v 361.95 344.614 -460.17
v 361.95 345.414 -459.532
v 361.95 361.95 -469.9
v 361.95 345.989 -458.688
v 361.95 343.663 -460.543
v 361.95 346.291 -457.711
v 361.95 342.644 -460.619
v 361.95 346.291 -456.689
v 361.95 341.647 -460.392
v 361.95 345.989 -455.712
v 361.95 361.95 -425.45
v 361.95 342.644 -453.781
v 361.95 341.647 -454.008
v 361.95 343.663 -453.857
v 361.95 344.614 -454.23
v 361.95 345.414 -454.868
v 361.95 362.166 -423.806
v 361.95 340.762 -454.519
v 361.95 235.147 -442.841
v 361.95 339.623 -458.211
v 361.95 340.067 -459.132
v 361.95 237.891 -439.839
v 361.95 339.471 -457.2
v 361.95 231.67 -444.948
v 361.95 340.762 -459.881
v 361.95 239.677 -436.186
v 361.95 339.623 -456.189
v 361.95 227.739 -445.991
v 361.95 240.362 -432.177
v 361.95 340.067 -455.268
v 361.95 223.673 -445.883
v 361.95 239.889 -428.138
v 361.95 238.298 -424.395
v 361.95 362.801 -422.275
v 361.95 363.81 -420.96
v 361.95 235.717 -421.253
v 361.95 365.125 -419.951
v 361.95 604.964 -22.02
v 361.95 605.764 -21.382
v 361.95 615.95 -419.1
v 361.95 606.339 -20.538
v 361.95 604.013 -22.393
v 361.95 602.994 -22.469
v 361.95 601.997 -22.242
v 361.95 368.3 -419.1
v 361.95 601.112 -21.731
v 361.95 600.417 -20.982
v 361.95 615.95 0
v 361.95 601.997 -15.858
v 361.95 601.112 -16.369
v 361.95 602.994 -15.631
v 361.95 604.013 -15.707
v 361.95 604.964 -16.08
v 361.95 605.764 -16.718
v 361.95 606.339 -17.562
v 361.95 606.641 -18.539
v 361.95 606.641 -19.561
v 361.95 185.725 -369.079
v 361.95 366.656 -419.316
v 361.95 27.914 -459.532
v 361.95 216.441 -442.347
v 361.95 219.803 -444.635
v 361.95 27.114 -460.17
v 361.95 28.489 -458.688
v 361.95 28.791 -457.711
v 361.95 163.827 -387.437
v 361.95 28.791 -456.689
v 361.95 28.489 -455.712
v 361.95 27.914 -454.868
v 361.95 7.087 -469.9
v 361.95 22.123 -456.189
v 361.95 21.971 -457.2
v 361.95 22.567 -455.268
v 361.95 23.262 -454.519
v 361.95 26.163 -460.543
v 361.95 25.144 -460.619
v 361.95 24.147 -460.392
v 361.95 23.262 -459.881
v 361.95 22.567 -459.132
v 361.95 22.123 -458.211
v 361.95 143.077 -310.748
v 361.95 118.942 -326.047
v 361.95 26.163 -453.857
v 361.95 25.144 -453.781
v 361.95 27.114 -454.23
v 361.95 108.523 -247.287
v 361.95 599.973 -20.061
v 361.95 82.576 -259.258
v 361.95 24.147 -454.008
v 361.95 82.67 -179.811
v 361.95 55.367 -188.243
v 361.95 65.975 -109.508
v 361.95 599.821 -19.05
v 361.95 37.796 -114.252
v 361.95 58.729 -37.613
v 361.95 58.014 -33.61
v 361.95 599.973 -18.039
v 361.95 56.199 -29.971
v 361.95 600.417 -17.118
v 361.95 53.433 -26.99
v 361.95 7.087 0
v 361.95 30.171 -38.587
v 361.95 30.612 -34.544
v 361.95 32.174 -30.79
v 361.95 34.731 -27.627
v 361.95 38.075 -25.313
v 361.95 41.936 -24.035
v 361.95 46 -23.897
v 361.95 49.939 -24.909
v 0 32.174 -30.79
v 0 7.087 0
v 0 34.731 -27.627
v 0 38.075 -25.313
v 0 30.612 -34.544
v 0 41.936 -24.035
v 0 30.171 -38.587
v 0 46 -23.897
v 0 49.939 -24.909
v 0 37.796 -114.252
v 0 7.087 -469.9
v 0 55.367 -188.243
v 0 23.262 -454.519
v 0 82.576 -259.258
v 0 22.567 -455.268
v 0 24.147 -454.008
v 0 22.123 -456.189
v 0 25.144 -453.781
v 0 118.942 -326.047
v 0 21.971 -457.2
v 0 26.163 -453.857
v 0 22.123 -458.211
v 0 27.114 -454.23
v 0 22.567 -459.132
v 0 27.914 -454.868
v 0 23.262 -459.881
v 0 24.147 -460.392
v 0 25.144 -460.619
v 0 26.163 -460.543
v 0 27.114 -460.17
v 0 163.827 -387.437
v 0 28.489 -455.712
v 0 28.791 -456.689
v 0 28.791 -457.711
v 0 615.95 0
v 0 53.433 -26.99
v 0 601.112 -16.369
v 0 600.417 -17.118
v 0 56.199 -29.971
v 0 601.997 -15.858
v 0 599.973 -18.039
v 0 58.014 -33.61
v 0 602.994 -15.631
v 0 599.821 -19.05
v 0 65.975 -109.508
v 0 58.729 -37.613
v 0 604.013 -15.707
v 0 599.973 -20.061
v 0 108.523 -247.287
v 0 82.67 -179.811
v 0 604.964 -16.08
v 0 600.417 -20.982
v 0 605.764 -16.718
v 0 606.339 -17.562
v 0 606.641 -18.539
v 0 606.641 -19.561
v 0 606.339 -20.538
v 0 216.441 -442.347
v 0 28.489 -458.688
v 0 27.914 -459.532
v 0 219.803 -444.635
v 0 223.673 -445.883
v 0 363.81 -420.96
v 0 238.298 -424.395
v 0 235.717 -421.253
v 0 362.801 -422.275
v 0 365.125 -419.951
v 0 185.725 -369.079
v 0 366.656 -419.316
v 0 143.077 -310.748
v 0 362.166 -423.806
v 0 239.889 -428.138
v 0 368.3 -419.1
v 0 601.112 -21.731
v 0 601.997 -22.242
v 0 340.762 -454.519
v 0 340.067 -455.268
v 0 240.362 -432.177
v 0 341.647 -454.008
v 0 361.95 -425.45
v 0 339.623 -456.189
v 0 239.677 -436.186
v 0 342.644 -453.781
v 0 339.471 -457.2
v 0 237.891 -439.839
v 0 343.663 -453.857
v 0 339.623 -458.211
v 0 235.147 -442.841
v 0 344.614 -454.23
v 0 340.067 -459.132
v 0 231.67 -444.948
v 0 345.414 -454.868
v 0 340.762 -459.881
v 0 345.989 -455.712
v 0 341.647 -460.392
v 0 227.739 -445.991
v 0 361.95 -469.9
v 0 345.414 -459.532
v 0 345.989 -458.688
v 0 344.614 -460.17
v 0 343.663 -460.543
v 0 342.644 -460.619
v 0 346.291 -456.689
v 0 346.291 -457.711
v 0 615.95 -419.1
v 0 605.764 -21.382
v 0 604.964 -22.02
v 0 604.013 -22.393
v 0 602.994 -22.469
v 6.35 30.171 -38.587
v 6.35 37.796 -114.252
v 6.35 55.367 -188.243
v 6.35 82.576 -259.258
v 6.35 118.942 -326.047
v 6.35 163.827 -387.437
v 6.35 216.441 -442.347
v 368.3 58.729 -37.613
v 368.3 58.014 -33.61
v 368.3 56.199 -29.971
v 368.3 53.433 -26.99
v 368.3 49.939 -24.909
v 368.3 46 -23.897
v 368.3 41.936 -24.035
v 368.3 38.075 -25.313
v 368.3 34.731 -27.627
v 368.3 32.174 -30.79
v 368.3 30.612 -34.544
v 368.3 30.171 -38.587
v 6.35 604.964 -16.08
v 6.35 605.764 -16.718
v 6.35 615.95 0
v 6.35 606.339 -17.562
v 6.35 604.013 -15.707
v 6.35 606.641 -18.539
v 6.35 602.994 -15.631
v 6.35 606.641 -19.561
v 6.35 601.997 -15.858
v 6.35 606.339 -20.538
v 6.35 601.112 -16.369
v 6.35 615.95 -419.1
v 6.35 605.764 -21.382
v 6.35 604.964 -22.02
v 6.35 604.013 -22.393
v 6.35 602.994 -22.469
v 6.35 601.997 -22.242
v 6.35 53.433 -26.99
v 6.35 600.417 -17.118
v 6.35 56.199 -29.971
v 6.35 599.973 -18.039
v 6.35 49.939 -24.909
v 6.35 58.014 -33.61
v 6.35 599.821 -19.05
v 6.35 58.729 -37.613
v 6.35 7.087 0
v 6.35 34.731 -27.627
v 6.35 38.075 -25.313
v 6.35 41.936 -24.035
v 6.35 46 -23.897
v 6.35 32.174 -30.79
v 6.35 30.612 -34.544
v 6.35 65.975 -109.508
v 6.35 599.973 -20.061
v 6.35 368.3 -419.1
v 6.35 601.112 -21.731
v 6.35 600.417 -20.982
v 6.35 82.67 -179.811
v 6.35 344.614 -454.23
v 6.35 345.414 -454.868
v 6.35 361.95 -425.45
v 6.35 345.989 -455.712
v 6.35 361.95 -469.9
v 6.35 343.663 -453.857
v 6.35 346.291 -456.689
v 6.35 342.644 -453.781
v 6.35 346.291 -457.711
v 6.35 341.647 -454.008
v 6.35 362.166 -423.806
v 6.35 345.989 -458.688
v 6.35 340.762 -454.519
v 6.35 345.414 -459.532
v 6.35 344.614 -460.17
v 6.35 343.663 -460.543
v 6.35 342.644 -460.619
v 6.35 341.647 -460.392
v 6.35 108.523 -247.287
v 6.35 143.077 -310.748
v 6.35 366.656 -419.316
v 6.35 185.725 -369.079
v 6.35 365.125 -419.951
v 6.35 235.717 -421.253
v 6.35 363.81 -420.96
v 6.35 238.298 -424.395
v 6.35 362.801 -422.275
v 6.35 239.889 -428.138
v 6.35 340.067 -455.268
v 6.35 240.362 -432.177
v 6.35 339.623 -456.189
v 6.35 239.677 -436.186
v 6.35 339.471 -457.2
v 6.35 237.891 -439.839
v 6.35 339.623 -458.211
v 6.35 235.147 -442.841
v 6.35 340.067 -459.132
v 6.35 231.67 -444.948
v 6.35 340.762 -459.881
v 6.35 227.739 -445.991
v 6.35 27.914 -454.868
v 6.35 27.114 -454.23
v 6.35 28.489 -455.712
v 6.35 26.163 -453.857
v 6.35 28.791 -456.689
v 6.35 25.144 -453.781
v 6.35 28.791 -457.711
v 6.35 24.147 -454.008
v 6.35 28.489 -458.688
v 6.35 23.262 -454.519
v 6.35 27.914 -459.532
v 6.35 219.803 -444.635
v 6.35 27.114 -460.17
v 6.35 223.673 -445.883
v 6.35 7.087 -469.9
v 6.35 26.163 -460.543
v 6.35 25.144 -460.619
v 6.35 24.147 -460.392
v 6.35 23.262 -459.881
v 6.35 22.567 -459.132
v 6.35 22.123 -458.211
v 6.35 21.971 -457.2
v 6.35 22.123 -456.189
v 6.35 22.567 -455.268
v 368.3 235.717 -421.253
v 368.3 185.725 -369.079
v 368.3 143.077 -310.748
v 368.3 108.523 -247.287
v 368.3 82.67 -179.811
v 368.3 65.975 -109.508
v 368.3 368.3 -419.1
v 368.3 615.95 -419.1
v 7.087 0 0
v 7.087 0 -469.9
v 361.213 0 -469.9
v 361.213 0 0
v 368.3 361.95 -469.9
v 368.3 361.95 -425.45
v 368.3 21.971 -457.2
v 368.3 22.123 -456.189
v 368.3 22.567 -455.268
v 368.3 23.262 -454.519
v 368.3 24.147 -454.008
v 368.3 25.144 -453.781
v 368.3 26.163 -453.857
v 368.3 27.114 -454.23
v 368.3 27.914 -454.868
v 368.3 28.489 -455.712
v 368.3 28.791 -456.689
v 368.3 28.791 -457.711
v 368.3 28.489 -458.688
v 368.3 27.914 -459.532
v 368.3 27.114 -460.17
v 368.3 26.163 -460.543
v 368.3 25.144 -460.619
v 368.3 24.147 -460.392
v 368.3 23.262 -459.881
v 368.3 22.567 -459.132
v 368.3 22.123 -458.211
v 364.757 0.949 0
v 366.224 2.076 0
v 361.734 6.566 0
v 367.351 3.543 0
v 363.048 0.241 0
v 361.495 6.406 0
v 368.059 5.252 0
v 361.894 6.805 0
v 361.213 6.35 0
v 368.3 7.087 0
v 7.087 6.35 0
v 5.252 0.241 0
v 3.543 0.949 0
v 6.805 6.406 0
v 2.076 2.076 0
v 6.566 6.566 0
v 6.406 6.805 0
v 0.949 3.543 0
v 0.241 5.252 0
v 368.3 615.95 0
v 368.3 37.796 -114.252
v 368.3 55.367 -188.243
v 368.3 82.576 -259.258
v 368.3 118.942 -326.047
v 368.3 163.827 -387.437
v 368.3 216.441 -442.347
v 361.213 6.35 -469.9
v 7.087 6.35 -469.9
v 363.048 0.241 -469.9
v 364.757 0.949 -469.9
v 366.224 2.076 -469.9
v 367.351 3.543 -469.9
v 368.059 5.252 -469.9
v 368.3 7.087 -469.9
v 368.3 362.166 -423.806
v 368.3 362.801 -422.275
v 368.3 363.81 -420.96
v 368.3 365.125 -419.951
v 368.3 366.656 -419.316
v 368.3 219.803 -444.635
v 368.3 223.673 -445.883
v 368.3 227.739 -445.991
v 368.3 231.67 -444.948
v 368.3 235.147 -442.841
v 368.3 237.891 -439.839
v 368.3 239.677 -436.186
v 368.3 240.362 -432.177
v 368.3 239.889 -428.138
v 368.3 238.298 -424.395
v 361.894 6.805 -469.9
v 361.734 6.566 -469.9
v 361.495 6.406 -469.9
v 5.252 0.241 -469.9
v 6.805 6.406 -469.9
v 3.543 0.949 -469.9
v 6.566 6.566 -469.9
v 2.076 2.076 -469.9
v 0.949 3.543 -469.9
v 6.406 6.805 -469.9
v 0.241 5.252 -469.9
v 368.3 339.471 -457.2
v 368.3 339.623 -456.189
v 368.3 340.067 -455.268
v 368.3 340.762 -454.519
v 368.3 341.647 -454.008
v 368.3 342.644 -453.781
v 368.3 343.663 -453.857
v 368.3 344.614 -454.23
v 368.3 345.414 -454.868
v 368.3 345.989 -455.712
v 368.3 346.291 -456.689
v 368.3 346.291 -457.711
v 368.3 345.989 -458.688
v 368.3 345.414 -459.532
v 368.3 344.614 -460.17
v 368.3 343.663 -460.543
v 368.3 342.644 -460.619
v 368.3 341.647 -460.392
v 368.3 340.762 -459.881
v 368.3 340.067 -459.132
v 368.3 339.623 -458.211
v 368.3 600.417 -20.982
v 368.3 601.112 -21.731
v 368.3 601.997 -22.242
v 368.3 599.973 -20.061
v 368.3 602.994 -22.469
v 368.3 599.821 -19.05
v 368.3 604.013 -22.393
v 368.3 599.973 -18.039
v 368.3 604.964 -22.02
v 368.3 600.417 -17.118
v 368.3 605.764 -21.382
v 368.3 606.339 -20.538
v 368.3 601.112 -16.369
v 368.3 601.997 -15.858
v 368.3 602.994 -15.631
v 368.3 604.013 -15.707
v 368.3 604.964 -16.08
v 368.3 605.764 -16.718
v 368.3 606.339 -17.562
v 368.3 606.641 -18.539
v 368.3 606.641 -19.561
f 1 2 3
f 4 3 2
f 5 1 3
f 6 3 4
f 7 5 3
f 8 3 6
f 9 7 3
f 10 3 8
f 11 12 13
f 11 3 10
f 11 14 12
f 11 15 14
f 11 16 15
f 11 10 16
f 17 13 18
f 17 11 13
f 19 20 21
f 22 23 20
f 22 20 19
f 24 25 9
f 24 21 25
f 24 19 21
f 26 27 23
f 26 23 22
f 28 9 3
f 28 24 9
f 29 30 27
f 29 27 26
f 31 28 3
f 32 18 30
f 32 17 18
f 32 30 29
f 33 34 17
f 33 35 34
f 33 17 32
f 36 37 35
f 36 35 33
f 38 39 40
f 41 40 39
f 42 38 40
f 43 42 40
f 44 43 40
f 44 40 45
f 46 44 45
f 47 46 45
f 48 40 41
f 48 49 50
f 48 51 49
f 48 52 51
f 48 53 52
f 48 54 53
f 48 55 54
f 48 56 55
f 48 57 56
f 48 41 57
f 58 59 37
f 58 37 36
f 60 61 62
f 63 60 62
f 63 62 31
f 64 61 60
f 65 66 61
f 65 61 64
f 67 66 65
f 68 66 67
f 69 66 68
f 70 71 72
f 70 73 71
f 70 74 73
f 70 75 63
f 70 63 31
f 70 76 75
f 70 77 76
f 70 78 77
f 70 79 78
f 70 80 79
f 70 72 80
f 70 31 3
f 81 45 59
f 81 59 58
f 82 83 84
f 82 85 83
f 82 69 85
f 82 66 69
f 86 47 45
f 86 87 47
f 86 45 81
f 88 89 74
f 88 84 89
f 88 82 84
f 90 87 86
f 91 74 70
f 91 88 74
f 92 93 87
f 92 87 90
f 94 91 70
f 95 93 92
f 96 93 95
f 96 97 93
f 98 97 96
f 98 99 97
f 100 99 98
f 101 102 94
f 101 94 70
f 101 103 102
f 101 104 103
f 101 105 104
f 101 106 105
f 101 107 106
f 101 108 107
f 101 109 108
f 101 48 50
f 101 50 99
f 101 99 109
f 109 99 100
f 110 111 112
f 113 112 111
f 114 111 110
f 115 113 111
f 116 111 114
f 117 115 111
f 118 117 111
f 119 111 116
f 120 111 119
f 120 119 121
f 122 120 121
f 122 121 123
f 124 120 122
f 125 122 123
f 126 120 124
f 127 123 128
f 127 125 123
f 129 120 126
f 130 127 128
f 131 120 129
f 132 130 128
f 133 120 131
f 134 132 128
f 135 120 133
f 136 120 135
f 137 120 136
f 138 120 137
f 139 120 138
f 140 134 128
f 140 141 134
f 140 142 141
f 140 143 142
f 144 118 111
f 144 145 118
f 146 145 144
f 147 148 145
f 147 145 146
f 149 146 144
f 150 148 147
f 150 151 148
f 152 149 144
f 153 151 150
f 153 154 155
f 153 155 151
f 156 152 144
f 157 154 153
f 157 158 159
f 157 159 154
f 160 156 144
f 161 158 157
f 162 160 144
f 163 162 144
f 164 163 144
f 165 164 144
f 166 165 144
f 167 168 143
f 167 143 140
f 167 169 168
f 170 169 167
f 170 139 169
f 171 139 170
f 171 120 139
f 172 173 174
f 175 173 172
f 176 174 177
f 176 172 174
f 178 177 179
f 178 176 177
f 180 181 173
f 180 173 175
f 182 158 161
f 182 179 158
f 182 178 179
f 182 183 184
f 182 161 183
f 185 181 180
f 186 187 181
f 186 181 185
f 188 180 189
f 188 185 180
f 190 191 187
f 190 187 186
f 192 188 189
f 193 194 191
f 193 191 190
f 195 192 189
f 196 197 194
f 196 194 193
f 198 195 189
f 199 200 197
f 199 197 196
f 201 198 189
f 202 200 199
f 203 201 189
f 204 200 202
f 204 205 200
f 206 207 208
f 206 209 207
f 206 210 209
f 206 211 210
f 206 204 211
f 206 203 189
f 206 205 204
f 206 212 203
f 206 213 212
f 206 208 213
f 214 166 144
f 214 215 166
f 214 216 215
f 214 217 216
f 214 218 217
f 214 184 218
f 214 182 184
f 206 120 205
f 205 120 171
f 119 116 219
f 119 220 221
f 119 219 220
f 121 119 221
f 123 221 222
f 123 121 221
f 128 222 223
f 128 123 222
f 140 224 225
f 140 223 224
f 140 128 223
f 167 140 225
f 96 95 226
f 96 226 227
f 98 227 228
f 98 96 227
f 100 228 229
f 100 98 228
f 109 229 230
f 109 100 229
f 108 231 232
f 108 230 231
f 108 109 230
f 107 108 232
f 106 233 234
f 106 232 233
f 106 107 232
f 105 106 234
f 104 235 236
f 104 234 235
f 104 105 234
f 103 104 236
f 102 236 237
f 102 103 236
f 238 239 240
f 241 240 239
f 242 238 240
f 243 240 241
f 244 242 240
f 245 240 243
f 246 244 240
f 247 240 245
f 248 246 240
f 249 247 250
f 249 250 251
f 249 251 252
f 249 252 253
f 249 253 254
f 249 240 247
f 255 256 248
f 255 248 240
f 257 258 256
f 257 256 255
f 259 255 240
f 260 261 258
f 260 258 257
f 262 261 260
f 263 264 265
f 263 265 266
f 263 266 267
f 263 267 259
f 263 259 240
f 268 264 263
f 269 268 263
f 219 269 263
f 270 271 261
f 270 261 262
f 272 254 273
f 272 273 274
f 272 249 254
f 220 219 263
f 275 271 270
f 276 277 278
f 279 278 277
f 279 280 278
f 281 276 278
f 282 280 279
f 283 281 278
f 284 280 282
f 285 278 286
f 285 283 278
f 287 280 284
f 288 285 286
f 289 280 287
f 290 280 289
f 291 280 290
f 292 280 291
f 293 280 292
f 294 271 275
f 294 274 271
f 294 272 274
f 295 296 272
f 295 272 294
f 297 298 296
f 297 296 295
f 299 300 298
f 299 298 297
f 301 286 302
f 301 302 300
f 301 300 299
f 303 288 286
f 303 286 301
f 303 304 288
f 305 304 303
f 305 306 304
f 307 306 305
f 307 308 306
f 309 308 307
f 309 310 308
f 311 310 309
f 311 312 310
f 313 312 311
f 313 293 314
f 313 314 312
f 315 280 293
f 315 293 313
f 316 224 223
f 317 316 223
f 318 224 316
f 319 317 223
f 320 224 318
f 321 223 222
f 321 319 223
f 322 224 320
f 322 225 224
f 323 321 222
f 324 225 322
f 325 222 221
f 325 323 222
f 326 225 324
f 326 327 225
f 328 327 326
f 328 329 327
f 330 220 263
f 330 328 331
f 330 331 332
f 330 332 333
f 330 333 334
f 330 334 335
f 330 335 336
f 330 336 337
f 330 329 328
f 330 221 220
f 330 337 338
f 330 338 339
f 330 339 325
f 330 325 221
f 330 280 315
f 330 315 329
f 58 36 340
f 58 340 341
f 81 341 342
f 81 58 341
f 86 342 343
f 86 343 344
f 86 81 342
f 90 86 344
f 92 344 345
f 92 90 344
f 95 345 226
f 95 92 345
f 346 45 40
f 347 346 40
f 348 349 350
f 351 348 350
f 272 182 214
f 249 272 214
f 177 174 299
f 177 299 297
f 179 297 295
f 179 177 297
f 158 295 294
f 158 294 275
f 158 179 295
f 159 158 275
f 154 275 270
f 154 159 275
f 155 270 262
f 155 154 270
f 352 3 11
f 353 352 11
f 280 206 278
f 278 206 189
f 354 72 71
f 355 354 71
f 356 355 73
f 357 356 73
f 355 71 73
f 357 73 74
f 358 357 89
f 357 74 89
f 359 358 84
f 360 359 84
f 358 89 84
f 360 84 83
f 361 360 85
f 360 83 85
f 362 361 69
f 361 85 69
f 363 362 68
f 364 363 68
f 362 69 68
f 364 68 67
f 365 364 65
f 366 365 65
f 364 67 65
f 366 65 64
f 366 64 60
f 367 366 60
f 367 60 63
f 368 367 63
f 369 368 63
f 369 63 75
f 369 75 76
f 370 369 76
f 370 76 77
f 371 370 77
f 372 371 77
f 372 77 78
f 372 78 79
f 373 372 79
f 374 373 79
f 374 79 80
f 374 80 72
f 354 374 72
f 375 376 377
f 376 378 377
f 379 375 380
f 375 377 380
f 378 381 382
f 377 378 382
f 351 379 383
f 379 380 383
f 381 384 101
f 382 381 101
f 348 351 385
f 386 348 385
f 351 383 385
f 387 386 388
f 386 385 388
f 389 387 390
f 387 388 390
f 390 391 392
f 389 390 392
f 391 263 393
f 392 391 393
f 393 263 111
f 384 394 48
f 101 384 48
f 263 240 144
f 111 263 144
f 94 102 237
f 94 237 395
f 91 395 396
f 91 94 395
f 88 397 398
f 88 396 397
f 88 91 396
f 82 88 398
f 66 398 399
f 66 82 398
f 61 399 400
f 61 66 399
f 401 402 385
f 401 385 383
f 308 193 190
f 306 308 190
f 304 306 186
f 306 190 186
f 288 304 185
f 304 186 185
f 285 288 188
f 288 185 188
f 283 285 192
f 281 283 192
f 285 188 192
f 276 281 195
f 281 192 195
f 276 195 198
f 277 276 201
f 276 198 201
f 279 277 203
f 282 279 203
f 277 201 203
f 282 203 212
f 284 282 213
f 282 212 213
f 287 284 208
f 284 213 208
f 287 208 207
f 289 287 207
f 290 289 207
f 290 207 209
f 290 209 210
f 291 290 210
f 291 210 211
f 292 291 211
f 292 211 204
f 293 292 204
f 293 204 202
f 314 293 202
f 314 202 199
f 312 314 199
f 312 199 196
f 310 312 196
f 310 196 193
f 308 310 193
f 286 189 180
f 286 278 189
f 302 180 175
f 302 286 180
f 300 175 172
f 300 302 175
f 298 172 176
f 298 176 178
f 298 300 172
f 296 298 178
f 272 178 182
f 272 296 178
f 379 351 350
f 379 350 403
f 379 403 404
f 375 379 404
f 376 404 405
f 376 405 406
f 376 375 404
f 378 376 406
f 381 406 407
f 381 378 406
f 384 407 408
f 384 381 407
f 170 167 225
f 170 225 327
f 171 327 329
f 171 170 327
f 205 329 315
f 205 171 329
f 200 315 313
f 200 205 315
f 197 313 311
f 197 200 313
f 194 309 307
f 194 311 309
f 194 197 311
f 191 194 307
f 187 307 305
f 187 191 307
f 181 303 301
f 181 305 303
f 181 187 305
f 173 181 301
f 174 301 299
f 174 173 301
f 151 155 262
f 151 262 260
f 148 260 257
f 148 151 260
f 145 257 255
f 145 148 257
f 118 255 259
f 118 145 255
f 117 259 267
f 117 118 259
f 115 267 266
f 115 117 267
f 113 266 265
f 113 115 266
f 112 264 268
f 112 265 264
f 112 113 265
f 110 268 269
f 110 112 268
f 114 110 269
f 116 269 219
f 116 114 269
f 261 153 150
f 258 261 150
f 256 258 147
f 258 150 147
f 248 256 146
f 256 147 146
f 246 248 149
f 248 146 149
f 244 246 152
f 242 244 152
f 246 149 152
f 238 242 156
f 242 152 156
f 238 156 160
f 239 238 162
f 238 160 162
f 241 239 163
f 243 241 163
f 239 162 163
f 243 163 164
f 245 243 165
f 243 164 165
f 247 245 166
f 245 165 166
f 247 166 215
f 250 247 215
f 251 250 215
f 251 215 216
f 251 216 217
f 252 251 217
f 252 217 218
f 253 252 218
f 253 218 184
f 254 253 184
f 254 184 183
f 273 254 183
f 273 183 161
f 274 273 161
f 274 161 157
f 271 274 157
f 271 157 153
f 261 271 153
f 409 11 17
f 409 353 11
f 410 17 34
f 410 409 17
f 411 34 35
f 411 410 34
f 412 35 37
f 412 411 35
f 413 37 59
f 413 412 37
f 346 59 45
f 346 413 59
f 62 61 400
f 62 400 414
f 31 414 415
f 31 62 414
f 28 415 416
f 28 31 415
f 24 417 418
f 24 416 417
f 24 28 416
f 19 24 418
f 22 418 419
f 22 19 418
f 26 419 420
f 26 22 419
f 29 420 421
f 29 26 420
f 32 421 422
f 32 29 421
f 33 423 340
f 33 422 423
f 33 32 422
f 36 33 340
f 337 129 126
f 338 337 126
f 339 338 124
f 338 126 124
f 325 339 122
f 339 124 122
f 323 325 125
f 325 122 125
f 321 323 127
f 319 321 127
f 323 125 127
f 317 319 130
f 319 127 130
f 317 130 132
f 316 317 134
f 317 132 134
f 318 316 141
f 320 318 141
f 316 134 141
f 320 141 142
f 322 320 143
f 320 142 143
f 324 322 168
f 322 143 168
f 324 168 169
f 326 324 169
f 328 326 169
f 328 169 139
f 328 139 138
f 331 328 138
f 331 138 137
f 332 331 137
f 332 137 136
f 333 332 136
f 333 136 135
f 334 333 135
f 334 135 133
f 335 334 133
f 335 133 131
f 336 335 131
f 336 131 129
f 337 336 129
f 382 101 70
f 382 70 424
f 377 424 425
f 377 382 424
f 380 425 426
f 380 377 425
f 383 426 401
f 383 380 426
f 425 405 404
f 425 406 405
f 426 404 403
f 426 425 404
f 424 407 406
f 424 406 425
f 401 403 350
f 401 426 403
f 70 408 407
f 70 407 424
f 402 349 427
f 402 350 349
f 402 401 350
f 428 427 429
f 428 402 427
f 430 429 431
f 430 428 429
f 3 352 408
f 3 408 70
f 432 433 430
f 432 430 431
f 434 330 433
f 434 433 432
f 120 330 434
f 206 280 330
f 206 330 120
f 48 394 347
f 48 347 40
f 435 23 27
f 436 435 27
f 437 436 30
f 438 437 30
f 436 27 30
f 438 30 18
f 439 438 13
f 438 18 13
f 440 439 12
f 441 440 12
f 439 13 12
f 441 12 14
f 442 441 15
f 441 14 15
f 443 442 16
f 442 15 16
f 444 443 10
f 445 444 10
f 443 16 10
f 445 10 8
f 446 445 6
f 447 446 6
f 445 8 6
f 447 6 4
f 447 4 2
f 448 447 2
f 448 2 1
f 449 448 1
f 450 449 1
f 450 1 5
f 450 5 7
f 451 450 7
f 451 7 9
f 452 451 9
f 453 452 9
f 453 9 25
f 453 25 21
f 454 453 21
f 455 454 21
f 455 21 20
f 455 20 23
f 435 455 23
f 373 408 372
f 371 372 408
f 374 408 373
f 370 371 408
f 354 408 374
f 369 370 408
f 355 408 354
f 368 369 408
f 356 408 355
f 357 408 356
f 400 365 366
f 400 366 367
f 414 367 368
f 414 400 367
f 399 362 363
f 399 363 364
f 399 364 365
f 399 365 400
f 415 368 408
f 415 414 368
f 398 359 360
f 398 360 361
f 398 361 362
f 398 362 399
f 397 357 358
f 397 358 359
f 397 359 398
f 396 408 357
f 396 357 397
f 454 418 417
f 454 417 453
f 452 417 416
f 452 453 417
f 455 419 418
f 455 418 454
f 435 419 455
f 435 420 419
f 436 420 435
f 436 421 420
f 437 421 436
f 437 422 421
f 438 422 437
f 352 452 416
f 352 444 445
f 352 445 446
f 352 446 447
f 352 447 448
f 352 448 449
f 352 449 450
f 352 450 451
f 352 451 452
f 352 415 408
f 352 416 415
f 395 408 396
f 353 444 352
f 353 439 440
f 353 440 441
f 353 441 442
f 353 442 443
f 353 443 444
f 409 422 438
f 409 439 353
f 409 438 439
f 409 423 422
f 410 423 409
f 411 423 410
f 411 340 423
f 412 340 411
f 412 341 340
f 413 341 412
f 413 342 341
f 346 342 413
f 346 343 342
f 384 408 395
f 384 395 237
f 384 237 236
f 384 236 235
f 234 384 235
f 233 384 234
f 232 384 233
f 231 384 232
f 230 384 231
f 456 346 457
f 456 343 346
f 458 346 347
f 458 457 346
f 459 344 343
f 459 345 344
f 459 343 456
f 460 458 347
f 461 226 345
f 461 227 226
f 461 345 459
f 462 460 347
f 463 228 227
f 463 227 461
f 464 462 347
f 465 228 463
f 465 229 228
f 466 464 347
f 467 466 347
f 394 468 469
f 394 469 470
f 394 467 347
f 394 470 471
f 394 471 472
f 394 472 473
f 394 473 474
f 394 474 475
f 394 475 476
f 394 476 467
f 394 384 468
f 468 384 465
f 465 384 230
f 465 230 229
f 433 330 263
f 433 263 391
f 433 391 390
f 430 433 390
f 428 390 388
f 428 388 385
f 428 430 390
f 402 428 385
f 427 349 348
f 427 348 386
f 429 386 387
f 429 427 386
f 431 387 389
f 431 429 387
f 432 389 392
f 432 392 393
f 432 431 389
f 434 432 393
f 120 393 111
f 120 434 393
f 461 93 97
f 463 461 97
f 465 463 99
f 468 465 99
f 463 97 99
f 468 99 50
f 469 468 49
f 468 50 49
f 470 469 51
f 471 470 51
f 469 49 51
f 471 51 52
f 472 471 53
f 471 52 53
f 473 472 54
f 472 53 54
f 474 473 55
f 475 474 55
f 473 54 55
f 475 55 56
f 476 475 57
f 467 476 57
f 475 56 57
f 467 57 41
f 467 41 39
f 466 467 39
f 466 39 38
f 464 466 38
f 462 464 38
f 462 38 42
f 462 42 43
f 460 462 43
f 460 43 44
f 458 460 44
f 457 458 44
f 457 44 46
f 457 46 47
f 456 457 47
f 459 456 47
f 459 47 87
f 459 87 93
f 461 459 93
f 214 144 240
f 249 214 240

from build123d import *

# Parameters (mm, degrees)
SKETCH1_W                    = 368.3
SKETCH1_H                    = 469.9
BASE_FLANGE1_DEPTH           = 6.35
EDGE_FLANGE1_STRIP_W         = 26.8732
EDGE_FLANGE1_STRIP_H         = 6.35
EDGE_FLANGE1_STRIP_CUT_DEPTH = 469.9
EDGE_FLANGE1_DEPTH           = 469.9
EDGE_FLANGE2_STRIP_W         = 26.8732
EDGE_FLANGE2_STRIP_H         = 6.35
EDGE_FLANGE2_STRIP_CUT_DEPTH = 469.9
EDGE_FLANGE2_DEPTH           = 469.9
SKETCH14_R                   = 3.429
SKETCH14_W                   = 50.8
SKETCH14_H                   = 254
CUT_EXTRUDE1_DEPTH           = 858.814258741
FILLET1_R                    = 6.35
CUT_EXTRUDE2_DEPTH           = 858.814258741


# Sheet-metal steps are written as plain solids
with BuildPart() as part:
    # Sketch1 → Base-Flange1 (new body)
    with BuildSketch(Plane(origin=(0, 0, 0), x_dir=(1, 0, 0), z_dir=(0, 1, 0))):
        with Locations((184.15, 234.95)):
            Rectangle(SKETCH1_W, SKETCH1_H)
    extrude(amount=BASE_FLANGE1_DEPTH)

    # Edge-Flange1 strip (across the edge) → Edge-Flange1 strip cut (cut)
    with BuildSketch(Plane(origin=(368.3, 6.35, 0), x_dir=(-1, 0, 0), z_dir=(0, 0, -1))):
        with Locations((-6.35, -3.175)):
            Rectangle(EDGE_FLANGE1_STRIP_W, EDGE_FLANGE1_STRIP_H)
    extrude(amount=EDGE_FLANGE1_STRIP_CUT_DEPTH, mode=Mode.SUBTRACT)

    # Edge-Flange1 section (across the edge) → Edge-Flange1 (add)
    with BuildSketch(Plane(origin=(368.3, 6.35, 0), x_dir=(-1, 0, 0), z_dir=(0, 0, -1))):
        with BuildLine():
            Line((0, 0.7366), (0, 609.6))
            Line((0, 609.6), (6.35, 609.6))
            Line((6.35, 609.6), (6.35, 0.7366))
            ThreePointArc((6.35, 0.7366), (6.565745145, 0.215745145), (7.0866, 0))
            Line((7.0866, 0), (7.0866, -6.35))
            ThreePointArc((7.0866, -6.35), (2.075617084, -4.274382916), (0, 0.7366))
        make_face()
    extrude(amount=EDGE_FLANGE1_DEPTH)

    # Edge-Flange2 strip (across the edge) → Edge-Flange2 strip cut (cut)
    with BuildSketch(Plane(origin=(0, 6.35, -469.9), x_dir=(1, 0, 0), z_dir=(0, 0, 1))):
        with Locations((-6.35, -3.175)):
            Rectangle(EDGE_FLANGE2_STRIP_W, EDGE_FLANGE2_STRIP_H)
    extrude(amount=EDGE_FLANGE2_STRIP_CUT_DEPTH, mode=Mode.SUBTRACT)

    # Edge-Flange2 section (across the edge) → Edge-Flange2 (add)
    with BuildSketch(Plane(origin=(0, 6.35, -469.9), x_dir=(1, 0, 0), z_dir=(0, 0, 1))):
        with BuildLine():
            Line((0, 0.7366), (0, 609.6))
            Line((0, 609.6), (6.35, 609.6))
            Line((6.35, 609.6), (6.35, 0.7366))
            ThreePointArc((6.35, 0.7366), (6.565745145, 0.215745145), (7.0866, 0))
            Line((7.0866, 0), (7.0866, -6.35))
            ThreePointArc((7.0866, -6.35), (2.075617084, -4.274382916), (0, 0.7366))
        make_face()
    extrude(amount=EDGE_FLANGE2_DEPTH)

    # Sketch14 → Cut-Extrude1 (cut, through all)
    with BuildSketch(Plane.ZY):
        with Locations(Location((-19.05, 603.25, 0), (0, 0, 270))):
            Circle(SKETCH14_R)
        with Locations(Location((-457.2, 342.9, 0), (0, 0, 270))):
            Circle(SKETCH14_R)
        with Locations(Location((-457.2, 25.4, 0), (0, 0, 270))):
            Circle(SKETCH14_R)
        with Locations((-444.5, 488.95)):
            Rectangle(SKETCH14_W, SKETCH14_H)
    extrude(amount=-CUT_EXTRUDE1_DEPTH, mode=Mode.SUBTRACT)

    # Fillet1
    fillet1_edges = [part.edges().sort_by_distance(p)[0] for p in [
        (365.125, 361.95, -419.1),
        (3.175, 361.95, -419.1),
    ]]
    fillet(fillet1_edges, radius=FILLET1_R)

    # Sketch15 → Cut-Extrude2 (cut, through all)
    with BuildSketch(Plane.ZY):
        with BuildLine():
            ThreePointArc((-421.252860066, 235.717214458), (-247.287179467, 108.52252047), (-37.613208926, 58.729204834))
            ThreePointArc((-37.613208926, 58.729204834), (-23.820795166, 43.963208926), (-38.586791074, 30.170795166))
            ThreePointArc((-38.586791074, 30.170795166), (-259.257504441, 82.575614199), (-442.347139934, 216.441271373))
            ThreePointArc((-442.347139934, 216.441271373), (-441.437971542, 236.62638285), (-421.252860066, 235.717214458))
        make_face()
    extrude(amount=-CUT_EXTRUDE2_DEPTH, mode=Mode.SUBTRACT)


solid = part.part
